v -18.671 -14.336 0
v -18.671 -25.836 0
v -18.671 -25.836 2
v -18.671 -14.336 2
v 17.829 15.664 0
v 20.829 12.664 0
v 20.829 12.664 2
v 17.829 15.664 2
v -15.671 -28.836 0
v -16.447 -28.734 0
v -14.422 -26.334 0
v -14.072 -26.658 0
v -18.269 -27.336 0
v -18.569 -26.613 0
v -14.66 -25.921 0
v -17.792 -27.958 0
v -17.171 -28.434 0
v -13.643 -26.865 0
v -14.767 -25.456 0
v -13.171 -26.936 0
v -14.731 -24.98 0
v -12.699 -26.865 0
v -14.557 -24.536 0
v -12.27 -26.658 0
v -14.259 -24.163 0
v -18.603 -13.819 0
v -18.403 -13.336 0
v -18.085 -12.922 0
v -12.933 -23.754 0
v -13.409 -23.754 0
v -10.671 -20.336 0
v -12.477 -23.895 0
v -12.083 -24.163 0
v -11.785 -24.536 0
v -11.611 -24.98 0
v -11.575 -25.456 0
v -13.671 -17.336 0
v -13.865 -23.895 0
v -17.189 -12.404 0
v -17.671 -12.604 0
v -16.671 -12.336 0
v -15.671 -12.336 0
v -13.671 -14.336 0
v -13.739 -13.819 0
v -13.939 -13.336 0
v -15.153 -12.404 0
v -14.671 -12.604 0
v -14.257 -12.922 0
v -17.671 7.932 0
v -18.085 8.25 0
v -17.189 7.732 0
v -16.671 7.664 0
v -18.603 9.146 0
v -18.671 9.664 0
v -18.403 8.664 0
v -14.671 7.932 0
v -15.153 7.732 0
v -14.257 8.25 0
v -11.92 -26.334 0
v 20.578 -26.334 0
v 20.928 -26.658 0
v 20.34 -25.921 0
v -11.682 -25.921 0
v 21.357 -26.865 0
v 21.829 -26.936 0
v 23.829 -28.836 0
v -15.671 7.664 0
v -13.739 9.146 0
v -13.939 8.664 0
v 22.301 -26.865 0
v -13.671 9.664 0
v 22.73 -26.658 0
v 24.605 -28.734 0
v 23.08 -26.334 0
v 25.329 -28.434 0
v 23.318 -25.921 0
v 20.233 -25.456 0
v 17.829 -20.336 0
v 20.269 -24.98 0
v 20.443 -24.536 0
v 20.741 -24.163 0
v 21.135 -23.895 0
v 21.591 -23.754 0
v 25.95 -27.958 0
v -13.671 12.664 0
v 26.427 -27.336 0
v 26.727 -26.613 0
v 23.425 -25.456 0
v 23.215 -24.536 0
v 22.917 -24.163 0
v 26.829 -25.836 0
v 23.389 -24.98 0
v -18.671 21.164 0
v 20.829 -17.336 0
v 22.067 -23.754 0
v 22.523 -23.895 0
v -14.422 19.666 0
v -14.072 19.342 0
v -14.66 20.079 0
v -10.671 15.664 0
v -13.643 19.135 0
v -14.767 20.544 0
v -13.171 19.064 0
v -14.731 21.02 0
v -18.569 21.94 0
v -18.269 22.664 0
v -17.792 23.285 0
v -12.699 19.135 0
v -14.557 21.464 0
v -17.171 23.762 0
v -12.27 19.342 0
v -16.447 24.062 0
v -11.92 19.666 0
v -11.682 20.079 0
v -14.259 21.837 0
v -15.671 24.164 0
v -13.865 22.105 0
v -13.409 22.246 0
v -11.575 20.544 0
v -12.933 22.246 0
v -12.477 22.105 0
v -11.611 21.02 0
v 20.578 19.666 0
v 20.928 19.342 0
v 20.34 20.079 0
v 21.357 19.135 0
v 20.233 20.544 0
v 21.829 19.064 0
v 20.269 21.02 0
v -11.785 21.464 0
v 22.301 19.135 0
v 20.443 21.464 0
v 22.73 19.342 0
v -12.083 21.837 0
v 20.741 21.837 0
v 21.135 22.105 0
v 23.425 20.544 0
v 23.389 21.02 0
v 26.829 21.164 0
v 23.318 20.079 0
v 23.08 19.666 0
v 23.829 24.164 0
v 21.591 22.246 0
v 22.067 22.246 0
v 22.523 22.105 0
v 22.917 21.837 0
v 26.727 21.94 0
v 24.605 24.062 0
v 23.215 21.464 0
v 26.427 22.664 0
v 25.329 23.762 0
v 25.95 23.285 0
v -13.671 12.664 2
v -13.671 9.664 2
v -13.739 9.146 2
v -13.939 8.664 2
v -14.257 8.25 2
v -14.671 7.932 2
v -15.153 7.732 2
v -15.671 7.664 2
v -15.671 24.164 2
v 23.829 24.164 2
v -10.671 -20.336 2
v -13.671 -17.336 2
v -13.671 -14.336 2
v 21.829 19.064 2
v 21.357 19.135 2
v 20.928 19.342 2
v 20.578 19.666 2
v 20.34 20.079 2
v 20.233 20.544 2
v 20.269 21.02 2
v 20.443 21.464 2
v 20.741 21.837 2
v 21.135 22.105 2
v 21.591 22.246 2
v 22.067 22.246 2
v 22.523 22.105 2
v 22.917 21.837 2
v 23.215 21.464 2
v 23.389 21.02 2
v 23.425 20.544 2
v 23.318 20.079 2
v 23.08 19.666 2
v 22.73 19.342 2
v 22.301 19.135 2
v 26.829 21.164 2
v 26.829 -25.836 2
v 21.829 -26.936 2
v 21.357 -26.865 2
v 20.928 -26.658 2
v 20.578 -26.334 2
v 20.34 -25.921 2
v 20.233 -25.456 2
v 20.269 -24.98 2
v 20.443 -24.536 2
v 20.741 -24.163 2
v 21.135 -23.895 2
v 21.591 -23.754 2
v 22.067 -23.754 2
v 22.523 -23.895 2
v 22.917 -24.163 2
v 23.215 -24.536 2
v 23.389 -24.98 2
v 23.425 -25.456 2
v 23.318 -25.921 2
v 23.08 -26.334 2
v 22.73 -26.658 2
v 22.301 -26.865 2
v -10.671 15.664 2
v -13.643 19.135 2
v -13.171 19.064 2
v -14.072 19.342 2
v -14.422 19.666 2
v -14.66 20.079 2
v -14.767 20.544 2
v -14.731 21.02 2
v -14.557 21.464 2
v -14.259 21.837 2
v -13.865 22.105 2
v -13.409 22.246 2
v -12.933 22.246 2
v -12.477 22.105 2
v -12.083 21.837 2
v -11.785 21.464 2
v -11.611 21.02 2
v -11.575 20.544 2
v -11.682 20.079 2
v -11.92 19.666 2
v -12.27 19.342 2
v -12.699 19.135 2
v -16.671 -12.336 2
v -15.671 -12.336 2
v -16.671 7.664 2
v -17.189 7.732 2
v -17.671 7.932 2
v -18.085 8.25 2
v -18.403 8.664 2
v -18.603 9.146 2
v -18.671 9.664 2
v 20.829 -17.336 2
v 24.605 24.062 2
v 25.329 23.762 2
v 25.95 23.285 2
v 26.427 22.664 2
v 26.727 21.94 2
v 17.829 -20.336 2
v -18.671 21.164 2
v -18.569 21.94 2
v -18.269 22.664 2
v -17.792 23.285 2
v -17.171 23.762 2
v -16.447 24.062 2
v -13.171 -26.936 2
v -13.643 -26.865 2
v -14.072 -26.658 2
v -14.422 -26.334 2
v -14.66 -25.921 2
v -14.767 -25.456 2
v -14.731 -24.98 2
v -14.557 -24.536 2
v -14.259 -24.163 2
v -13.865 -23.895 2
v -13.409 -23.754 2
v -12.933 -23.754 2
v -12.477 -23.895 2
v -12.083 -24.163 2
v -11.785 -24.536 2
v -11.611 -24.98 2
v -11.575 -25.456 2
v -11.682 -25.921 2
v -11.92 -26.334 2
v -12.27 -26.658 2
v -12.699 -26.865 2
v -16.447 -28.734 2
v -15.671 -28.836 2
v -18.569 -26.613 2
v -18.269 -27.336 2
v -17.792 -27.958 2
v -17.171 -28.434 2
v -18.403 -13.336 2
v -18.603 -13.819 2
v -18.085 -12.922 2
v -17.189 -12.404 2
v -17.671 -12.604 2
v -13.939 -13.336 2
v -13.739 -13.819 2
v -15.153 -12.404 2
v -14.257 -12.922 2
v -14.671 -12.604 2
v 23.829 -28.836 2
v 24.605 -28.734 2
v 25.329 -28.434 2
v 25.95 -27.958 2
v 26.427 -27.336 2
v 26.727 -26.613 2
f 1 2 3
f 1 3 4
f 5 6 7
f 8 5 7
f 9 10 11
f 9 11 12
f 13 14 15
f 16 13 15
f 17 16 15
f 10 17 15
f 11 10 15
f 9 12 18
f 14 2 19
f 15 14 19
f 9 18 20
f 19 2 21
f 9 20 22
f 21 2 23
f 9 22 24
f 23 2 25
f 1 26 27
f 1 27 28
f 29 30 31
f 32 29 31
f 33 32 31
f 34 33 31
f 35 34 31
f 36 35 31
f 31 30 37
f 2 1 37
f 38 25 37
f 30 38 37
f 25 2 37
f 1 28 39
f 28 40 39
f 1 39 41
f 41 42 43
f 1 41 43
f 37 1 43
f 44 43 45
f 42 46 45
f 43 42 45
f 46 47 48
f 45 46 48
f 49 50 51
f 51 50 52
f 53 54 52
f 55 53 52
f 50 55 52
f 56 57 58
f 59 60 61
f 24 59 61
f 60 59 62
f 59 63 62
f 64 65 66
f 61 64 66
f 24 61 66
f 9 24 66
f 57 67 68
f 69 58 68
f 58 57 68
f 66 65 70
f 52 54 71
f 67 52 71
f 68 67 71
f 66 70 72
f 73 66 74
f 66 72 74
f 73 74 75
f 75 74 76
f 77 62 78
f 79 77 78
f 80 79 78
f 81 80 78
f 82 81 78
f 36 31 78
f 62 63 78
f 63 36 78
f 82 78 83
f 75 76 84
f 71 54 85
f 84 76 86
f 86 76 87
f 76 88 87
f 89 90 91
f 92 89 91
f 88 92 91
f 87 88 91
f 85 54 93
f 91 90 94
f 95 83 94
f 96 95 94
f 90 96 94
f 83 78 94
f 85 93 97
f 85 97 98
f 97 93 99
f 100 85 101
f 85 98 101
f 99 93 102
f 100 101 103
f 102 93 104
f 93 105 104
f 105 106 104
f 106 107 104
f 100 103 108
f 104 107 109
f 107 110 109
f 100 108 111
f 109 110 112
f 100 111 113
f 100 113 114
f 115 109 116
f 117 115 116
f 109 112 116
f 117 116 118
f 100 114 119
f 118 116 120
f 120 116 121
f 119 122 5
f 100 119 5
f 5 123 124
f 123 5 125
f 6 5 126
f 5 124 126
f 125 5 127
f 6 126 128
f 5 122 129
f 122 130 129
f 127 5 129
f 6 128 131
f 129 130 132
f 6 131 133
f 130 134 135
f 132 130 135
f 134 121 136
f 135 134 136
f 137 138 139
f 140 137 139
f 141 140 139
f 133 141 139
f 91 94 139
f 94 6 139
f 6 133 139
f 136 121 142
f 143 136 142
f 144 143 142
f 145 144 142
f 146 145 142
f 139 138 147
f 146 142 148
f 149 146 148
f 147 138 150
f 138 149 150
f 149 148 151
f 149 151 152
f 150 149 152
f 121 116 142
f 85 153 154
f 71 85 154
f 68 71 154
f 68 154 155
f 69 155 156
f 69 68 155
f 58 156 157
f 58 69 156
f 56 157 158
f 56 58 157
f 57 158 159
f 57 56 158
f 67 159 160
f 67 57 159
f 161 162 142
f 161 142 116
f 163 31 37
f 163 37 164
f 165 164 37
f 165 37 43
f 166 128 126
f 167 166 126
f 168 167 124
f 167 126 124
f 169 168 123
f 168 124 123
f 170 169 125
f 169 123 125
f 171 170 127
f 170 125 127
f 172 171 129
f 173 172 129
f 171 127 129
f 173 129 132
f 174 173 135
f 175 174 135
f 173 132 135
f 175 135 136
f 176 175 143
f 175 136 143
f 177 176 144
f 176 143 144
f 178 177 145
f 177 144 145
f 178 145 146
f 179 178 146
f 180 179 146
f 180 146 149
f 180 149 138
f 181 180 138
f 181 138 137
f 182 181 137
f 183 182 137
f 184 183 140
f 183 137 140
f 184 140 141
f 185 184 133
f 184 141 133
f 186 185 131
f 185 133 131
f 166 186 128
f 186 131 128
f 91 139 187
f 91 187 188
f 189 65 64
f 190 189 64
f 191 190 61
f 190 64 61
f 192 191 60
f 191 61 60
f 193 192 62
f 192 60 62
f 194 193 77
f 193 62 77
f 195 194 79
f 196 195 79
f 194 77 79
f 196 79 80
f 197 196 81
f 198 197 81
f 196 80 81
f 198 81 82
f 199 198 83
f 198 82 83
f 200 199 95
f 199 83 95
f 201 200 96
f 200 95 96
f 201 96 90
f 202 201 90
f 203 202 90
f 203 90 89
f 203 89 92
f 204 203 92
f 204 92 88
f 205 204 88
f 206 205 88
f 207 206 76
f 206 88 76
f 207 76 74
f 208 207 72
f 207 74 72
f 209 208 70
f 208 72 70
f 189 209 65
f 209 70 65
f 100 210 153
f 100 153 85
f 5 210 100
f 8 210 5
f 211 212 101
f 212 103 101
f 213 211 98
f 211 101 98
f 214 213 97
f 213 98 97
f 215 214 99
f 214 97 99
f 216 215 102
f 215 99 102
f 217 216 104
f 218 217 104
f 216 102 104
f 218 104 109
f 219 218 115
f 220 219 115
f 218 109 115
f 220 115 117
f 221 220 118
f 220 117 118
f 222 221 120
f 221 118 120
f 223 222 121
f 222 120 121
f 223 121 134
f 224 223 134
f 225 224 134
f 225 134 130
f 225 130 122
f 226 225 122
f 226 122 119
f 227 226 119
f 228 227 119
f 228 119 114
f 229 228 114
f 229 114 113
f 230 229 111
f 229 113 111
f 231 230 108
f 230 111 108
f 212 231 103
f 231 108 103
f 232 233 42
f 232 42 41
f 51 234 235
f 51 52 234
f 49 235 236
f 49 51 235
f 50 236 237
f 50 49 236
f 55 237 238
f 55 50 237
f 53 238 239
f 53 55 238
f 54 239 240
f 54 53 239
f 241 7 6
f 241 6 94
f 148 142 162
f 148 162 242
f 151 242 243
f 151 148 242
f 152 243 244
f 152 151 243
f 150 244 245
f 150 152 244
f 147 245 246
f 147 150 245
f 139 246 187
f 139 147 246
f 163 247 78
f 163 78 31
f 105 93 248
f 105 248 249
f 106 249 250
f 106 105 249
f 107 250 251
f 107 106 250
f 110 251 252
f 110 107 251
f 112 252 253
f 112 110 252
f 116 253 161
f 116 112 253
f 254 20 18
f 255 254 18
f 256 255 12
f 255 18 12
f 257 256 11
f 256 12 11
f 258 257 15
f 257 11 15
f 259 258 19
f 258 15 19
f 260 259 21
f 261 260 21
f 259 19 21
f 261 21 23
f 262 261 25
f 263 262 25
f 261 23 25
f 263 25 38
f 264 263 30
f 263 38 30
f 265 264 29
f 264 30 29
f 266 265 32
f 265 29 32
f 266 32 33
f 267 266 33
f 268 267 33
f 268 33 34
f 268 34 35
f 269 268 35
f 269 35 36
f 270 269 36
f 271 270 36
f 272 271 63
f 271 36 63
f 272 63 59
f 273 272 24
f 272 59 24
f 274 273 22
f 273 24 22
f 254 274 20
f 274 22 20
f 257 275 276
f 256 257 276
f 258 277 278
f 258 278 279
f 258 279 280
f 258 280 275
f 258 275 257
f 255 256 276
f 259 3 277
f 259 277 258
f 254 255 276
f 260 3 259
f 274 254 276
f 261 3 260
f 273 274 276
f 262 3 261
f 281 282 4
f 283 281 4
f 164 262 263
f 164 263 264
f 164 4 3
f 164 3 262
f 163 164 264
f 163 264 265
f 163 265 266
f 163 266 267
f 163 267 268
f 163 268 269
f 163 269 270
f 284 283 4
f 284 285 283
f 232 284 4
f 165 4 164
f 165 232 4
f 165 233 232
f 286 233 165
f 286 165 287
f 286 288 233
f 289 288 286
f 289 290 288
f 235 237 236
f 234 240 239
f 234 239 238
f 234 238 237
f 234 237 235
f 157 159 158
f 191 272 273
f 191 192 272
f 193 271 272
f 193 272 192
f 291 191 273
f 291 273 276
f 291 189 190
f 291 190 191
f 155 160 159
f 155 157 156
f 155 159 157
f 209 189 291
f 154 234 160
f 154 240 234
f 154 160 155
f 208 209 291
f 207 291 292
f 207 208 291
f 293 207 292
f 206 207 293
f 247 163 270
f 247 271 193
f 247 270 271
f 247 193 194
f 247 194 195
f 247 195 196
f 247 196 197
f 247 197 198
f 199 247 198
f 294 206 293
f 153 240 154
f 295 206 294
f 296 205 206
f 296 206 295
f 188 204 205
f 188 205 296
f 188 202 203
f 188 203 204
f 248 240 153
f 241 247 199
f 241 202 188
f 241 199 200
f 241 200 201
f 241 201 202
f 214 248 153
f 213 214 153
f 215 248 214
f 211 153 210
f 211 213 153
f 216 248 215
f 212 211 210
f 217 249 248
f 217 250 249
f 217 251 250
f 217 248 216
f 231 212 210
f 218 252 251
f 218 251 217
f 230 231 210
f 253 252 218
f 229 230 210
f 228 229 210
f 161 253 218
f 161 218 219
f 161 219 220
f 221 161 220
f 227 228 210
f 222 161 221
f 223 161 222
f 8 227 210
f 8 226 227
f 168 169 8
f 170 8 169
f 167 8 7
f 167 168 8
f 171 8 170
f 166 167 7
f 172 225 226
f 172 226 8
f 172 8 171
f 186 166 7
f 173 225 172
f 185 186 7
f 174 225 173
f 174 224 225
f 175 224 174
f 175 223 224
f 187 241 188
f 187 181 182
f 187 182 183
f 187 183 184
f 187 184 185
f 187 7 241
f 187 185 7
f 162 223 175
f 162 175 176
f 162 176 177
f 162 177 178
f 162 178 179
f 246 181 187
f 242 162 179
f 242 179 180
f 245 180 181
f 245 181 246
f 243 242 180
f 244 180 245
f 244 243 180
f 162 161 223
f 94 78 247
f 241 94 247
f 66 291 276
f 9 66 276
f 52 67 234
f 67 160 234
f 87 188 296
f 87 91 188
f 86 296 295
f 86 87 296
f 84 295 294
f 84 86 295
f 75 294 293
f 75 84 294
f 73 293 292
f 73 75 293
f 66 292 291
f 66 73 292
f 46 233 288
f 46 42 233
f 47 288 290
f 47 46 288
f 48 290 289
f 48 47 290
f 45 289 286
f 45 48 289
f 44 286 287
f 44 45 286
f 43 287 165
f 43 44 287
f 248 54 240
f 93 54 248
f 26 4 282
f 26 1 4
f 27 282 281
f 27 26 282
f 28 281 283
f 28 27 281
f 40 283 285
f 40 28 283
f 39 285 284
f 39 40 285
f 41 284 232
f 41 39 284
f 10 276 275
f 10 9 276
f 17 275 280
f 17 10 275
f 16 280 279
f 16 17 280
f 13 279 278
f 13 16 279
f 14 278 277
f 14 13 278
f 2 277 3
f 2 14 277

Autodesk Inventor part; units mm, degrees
ref_plane "YZ Plane" through (0, 0, 0) normal (1, 0, 0) x (0, 1, 0)
ref_plane "XZ Plane" through (0, 0, 0) normal (0, 1, 0) x (-1, 0, 0)
ref_plane "XY Plane" through (0, 0, 0) normal (0, 0, 1) x (1, 0, 0)
sketch "Sketch1" plane through (0, 0, 0) normal (0, 0, 1) x (1, 0, 0)
  line L0 (-18.671, 23.6638) -> (26.829, 23.6638)
  line L1 (26.829, 23.6638) -> (26.829, -28.3362)
  line L2 (26.829, -28.3362) -> (-18.671, -28.3362)
  line L3 (-18.671, -28.3362) -> (-18.671, 23.6638)
  point P0 (0, 0)
  dimension "d0" = 52
  dimension "d1" = 45.5
extrude "Extrusion1" add sketch "Sketch1" along normal blind 2
sketch "Sketch2" plane through (0, 0, 2) normal (0, 0, 1) x (1, 0, 0)
  line L0 (-18.671, -28.3362) -> (26.829, -28.3362) projected
  line L1 (26.829, -28.3362) -> (26.829, 23.6638) projected
  line L2 (26.829, 23.6638) -> (-18.671, 23.6638) projected
  point P0 (0, 0)
  point P1 (-13.171, 20.6638)
  point P2 (21.829, 20.6638)
  point P3 (21.829, -25.3362)
  point P4 (-13.171, -25.3362)
  point P5 (23.829, -28.3362)
  point P6 (26.829, -25.3362)
  point P7 (26.829, 20.6638)
  point P8 (23.829, 23.6638)
  dimension "d5" = 35
  dimension "d6" = 35
  dimension "d7" = 46
  dimension "d8" = 3
  dimension "d9" = 3
  dimension "d10" = 5
  dimension "d11" = 5
  dimension "d12" = 3
hole "Hole1" at (-13.171, 20.6638, 2) at (21.829, 20.6638, 2) at (21.829, -25.3362, 2) at (-13.171, -25.3362, 2) direction (0, 0, -1) diameter 3.2 depth 10 tip angle 118
sketch "Sketch3" plane through (0, 0, 2) normal (0, 0, 1) x (1, 0, 0)
  line L0 (-18.671, 23.6638) -> (-18.671, -28.3362) projected
  line L1 (-18.671, 15.6638) -> (20.829, 15.6638)
  line L2 (20.829, 15.6638) -> (20.829, -20.3362)
  line L3 (20.829, -20.3362) -> (-18.671, -20.3362)
  line L4 (-18.671, -20.3362) -> (-18.671, 15.6638)
  circle A0 centre (-13.171, 20.6638) radius 1.6 projected
  line L5 (26.829, -28.3362) -> (26.829, 23.6638) projected
  circle A1 centre (-13.171, -25.3362) radius 1.6 projected
  point P0 (0, 0)
  point P1 (26.829, -25.3362)
  point P2 (26.829, 20.6638)
  dimension "d20" = 5
  dimension "d21" = 6
  dimension "d22" = 5
extrude "Extrusion2" cut sketch "Sketch3" against normal blind 2 contours L1 L2 L3 L0
sketch "Sketch4" plane through (0, 0, 2) normal (0, 0, 1) x (1, 0, 0)
  line L0 (-18.671, 15.6638) -> (20.829, 15.6638) projected
  line L1 (-18.671, 15.6638) -> (-13.671, 15.6638)
  line L2 (-13.671, 15.6638) -> (-13.671, 7.6638)
  line L3 (-13.671, 7.6638) -> (-18.671, 7.6638)
  line L4 (-18.671, 7.6638) -> (-18.671, 15.6638)
  line L5 (-18.671, -20.3362) -> (-18.671, -28.3362) projected
  line L6 (-18.671, -20.3362) -> (-13.671, -20.3362)
  line L7 (-13.671, -20.3362) -> (-13.671, -12.3362)
  line L8 (-13.671, -12.3362) -> (-18.671, -12.3362)
  line L9 (-18.671, -12.3362) -> (-18.671, -20.3362)
  point P0 (0, 0)
  point P1 (17.829, 15.6638)
  point P2 (-18.671, -25.3362)
  dimension "d27" = 8
  dimension "d28" = 8
  dimension "d29" = 5
extrude "Extrusion3" add sketch "Sketch4" against normal blind 2
fillet "Fillet5" radius 2 4 edges at (-13.671, 7.6638, 1) (-18.671, 7.6638, 1) (-18.671, -12.3362, 1) (-13.671, -12.3362, 1)
sketch "Sketch5" plane through (0, 0, 2) normal (0, 0, 1) x (1, 0, 0)
  line L0 (26.829, 23.6638) -> (-18.671, 23.6638) projected
  line L1 (-18.671, 23.6638) -> (26.829, 23.6638)
  line L2 (26.829, 23.6638) -> (26.829, 24.1638)
  line L3 (26.829, 24.1638) -> (-18.671, 24.1638)
  line L4 (-18.671, 24.1638) -> (-18.671, 23.6638)
  line L5 (-18.671, -28.3362) -> (26.829, -28.3362) projected
  line L6 (-18.671, -28.3362) -> (26.829, -28.3362)
  line L7 (26.829, -28.3362) -> (26.829, -28.8362)
  line L8 (26.829, -28.8362) -> (-18.671, -28.8362)
  line L9 (-18.671, -28.8362) -> (-18.671, -28.3362)
  line L10 (26.829, -28.3362) -> (26.829, 23.6638) projected
  point P0 (0, 0)
  dimension "d37" = 0.5
  dimension "d38" = 0.5
extrude "Extrusion4" add sketch "Sketch5" against normal blind 2
fillet "Fillet6" radius 3 4 edges at (-18.671, 24.1638, 1) (26.829, 24.1638, 1) (26.829, -28.8362, 1) (-18.671, -28.8362, 1)
chamfer "Chamfer2" distance 3 angle 45 4 edges at (-13.671, 15.6638, 1) (20.829, 15.6638, 1) (-13.671, -20.3362, 1) (20.829, -20.3362, 1)
sketch "Sketch6" plane through (0, 0, 2) normal (0, 0, 1) x (1, 0, 0)
  circle A0 centre (-13.171, -25.3362) radius 1.6 projected
  circle A1 centre (-13.171, 20.6638) radius 1.6 projected
  circle A2 centre (21.829, 20.6638) radius 1.6 projected
  line L0 (23.829, 24.1638) -> (-15.671, 24.1638) projected
  line L1 (-15.671, -28.8362) -> (23.829, -28.8362) projected
  circle A3 centre (21.829, -25.3362) radius 1.6 projected
  point P0 (0, 0)
  dimension "d46" = 46
  dimension "d47" = 35
  dimension "d48" = 3.5
  dimension "d49" = 3.5
  dimension "d50" = 3.5
  dimension "d51" = 3.5
properties part number "wood_supp"
